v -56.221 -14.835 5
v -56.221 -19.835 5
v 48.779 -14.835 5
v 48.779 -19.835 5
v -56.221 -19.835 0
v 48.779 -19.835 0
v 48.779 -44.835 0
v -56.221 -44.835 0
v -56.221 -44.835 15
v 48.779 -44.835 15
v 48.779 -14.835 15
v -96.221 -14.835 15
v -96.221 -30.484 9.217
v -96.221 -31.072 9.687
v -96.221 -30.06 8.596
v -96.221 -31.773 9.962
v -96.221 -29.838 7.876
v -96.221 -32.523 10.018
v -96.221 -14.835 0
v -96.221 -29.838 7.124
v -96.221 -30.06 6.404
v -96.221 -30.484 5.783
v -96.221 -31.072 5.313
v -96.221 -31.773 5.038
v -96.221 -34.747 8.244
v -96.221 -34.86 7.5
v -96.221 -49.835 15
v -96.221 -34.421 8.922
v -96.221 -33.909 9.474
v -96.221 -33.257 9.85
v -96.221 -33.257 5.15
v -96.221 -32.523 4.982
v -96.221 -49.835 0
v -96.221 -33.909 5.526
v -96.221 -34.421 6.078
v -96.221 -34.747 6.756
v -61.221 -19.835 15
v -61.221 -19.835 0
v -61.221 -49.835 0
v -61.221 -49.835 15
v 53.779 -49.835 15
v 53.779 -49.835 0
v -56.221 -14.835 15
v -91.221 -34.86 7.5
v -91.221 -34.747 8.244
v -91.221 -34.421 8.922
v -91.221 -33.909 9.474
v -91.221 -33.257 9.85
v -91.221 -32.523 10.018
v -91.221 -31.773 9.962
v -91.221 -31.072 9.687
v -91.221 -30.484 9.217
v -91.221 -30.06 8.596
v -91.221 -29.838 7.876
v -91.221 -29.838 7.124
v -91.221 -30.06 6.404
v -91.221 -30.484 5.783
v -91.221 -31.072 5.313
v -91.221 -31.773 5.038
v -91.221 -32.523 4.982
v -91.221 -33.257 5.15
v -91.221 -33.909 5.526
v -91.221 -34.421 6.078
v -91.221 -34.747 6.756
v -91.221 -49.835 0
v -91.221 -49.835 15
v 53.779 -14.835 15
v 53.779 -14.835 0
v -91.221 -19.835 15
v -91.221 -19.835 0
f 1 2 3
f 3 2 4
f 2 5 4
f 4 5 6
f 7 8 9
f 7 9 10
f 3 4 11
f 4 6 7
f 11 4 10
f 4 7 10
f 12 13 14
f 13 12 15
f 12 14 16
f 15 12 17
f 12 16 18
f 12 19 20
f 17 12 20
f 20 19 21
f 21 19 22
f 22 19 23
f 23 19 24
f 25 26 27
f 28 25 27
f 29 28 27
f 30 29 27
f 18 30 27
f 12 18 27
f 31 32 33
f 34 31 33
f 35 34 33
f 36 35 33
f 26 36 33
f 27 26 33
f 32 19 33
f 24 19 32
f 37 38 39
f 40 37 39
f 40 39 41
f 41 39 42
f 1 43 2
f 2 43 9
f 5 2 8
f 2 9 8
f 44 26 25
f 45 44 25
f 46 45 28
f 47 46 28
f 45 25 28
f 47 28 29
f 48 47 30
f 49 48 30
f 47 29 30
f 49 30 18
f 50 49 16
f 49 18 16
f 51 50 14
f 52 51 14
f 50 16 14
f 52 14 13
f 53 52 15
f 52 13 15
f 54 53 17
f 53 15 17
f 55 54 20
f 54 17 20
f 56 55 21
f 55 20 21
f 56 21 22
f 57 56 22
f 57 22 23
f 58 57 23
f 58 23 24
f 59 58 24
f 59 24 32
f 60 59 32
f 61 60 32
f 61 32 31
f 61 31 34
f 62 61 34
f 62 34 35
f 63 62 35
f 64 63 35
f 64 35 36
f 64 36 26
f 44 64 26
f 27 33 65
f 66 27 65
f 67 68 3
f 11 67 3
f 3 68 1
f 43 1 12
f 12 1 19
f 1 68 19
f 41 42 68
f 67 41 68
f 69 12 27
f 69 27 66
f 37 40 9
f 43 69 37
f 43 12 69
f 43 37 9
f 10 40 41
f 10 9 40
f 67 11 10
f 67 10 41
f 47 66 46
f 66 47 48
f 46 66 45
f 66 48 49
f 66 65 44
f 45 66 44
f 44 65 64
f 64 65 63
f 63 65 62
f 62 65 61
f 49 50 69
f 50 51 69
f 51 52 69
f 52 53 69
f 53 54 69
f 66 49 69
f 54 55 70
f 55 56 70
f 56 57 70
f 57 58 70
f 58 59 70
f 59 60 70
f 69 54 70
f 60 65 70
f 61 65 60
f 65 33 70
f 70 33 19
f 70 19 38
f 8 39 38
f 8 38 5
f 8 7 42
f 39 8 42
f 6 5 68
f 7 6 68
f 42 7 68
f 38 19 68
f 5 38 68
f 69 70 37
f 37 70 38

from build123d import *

# Parameters (mm, degrees)
F0_W     = 105
F0_H     = 25
F1_DEPTH = 15
F2_R     = 2.525
F3_DEPTH = 25
F4_W     = 105
F4_H     = 5
F5_DEPTH = 25


with BuildPart() as f1:
    # F0 (on Top) → F1 (new body)
    with BuildSketch(Plane.XY):
        Polygon((-61.220747, -19.834538), (-61.220747, -14.834538), (-96.220747, -14.834538), (-96.220747, -49.834538), (-91.220747, -49.834538), (-91.220747, -19.834538), align=None)
        Polygon((53.779253, -14.834538), (-61.220747, -14.834538), (-61.220747, -19.834538), (-61.220747, -49.834538), (53.779253, -49.834538), align=None)
        with Locations((-3.720747, -32.334538)):
            Rectangle(F0_W, F0_H, mode=Mode.SUBTRACT)
    extrude(amount=F1_DEPTH)

    # F2 (on face) → F3 (cut)
    with BuildSketch(Plane(origin=(-96.220747, 0, 0), x_dir=(0, -1, 0), z_dir=(-1, 0, 0))):
        with Locations((32.334538, 7.5)):
            Circle(F2_R)
    extrude(amount=-F3_DEPTH, mode=Mode.SUBTRACT)

    # F4 (on face) → F5 (cut)
    with BuildSketch(Plane.XZ.offset(19.834538)):
        with Locations((-3.720747, 12.5)):
            Rectangle(F4_W, F4_H)
        with Locations((-3.720747, 7.5)):
            Rectangle(F4_W, F4_H)
    extrude(amount=-F5_DEPTH, mode=Mode.SUBTRACT)


solid = f1.part
